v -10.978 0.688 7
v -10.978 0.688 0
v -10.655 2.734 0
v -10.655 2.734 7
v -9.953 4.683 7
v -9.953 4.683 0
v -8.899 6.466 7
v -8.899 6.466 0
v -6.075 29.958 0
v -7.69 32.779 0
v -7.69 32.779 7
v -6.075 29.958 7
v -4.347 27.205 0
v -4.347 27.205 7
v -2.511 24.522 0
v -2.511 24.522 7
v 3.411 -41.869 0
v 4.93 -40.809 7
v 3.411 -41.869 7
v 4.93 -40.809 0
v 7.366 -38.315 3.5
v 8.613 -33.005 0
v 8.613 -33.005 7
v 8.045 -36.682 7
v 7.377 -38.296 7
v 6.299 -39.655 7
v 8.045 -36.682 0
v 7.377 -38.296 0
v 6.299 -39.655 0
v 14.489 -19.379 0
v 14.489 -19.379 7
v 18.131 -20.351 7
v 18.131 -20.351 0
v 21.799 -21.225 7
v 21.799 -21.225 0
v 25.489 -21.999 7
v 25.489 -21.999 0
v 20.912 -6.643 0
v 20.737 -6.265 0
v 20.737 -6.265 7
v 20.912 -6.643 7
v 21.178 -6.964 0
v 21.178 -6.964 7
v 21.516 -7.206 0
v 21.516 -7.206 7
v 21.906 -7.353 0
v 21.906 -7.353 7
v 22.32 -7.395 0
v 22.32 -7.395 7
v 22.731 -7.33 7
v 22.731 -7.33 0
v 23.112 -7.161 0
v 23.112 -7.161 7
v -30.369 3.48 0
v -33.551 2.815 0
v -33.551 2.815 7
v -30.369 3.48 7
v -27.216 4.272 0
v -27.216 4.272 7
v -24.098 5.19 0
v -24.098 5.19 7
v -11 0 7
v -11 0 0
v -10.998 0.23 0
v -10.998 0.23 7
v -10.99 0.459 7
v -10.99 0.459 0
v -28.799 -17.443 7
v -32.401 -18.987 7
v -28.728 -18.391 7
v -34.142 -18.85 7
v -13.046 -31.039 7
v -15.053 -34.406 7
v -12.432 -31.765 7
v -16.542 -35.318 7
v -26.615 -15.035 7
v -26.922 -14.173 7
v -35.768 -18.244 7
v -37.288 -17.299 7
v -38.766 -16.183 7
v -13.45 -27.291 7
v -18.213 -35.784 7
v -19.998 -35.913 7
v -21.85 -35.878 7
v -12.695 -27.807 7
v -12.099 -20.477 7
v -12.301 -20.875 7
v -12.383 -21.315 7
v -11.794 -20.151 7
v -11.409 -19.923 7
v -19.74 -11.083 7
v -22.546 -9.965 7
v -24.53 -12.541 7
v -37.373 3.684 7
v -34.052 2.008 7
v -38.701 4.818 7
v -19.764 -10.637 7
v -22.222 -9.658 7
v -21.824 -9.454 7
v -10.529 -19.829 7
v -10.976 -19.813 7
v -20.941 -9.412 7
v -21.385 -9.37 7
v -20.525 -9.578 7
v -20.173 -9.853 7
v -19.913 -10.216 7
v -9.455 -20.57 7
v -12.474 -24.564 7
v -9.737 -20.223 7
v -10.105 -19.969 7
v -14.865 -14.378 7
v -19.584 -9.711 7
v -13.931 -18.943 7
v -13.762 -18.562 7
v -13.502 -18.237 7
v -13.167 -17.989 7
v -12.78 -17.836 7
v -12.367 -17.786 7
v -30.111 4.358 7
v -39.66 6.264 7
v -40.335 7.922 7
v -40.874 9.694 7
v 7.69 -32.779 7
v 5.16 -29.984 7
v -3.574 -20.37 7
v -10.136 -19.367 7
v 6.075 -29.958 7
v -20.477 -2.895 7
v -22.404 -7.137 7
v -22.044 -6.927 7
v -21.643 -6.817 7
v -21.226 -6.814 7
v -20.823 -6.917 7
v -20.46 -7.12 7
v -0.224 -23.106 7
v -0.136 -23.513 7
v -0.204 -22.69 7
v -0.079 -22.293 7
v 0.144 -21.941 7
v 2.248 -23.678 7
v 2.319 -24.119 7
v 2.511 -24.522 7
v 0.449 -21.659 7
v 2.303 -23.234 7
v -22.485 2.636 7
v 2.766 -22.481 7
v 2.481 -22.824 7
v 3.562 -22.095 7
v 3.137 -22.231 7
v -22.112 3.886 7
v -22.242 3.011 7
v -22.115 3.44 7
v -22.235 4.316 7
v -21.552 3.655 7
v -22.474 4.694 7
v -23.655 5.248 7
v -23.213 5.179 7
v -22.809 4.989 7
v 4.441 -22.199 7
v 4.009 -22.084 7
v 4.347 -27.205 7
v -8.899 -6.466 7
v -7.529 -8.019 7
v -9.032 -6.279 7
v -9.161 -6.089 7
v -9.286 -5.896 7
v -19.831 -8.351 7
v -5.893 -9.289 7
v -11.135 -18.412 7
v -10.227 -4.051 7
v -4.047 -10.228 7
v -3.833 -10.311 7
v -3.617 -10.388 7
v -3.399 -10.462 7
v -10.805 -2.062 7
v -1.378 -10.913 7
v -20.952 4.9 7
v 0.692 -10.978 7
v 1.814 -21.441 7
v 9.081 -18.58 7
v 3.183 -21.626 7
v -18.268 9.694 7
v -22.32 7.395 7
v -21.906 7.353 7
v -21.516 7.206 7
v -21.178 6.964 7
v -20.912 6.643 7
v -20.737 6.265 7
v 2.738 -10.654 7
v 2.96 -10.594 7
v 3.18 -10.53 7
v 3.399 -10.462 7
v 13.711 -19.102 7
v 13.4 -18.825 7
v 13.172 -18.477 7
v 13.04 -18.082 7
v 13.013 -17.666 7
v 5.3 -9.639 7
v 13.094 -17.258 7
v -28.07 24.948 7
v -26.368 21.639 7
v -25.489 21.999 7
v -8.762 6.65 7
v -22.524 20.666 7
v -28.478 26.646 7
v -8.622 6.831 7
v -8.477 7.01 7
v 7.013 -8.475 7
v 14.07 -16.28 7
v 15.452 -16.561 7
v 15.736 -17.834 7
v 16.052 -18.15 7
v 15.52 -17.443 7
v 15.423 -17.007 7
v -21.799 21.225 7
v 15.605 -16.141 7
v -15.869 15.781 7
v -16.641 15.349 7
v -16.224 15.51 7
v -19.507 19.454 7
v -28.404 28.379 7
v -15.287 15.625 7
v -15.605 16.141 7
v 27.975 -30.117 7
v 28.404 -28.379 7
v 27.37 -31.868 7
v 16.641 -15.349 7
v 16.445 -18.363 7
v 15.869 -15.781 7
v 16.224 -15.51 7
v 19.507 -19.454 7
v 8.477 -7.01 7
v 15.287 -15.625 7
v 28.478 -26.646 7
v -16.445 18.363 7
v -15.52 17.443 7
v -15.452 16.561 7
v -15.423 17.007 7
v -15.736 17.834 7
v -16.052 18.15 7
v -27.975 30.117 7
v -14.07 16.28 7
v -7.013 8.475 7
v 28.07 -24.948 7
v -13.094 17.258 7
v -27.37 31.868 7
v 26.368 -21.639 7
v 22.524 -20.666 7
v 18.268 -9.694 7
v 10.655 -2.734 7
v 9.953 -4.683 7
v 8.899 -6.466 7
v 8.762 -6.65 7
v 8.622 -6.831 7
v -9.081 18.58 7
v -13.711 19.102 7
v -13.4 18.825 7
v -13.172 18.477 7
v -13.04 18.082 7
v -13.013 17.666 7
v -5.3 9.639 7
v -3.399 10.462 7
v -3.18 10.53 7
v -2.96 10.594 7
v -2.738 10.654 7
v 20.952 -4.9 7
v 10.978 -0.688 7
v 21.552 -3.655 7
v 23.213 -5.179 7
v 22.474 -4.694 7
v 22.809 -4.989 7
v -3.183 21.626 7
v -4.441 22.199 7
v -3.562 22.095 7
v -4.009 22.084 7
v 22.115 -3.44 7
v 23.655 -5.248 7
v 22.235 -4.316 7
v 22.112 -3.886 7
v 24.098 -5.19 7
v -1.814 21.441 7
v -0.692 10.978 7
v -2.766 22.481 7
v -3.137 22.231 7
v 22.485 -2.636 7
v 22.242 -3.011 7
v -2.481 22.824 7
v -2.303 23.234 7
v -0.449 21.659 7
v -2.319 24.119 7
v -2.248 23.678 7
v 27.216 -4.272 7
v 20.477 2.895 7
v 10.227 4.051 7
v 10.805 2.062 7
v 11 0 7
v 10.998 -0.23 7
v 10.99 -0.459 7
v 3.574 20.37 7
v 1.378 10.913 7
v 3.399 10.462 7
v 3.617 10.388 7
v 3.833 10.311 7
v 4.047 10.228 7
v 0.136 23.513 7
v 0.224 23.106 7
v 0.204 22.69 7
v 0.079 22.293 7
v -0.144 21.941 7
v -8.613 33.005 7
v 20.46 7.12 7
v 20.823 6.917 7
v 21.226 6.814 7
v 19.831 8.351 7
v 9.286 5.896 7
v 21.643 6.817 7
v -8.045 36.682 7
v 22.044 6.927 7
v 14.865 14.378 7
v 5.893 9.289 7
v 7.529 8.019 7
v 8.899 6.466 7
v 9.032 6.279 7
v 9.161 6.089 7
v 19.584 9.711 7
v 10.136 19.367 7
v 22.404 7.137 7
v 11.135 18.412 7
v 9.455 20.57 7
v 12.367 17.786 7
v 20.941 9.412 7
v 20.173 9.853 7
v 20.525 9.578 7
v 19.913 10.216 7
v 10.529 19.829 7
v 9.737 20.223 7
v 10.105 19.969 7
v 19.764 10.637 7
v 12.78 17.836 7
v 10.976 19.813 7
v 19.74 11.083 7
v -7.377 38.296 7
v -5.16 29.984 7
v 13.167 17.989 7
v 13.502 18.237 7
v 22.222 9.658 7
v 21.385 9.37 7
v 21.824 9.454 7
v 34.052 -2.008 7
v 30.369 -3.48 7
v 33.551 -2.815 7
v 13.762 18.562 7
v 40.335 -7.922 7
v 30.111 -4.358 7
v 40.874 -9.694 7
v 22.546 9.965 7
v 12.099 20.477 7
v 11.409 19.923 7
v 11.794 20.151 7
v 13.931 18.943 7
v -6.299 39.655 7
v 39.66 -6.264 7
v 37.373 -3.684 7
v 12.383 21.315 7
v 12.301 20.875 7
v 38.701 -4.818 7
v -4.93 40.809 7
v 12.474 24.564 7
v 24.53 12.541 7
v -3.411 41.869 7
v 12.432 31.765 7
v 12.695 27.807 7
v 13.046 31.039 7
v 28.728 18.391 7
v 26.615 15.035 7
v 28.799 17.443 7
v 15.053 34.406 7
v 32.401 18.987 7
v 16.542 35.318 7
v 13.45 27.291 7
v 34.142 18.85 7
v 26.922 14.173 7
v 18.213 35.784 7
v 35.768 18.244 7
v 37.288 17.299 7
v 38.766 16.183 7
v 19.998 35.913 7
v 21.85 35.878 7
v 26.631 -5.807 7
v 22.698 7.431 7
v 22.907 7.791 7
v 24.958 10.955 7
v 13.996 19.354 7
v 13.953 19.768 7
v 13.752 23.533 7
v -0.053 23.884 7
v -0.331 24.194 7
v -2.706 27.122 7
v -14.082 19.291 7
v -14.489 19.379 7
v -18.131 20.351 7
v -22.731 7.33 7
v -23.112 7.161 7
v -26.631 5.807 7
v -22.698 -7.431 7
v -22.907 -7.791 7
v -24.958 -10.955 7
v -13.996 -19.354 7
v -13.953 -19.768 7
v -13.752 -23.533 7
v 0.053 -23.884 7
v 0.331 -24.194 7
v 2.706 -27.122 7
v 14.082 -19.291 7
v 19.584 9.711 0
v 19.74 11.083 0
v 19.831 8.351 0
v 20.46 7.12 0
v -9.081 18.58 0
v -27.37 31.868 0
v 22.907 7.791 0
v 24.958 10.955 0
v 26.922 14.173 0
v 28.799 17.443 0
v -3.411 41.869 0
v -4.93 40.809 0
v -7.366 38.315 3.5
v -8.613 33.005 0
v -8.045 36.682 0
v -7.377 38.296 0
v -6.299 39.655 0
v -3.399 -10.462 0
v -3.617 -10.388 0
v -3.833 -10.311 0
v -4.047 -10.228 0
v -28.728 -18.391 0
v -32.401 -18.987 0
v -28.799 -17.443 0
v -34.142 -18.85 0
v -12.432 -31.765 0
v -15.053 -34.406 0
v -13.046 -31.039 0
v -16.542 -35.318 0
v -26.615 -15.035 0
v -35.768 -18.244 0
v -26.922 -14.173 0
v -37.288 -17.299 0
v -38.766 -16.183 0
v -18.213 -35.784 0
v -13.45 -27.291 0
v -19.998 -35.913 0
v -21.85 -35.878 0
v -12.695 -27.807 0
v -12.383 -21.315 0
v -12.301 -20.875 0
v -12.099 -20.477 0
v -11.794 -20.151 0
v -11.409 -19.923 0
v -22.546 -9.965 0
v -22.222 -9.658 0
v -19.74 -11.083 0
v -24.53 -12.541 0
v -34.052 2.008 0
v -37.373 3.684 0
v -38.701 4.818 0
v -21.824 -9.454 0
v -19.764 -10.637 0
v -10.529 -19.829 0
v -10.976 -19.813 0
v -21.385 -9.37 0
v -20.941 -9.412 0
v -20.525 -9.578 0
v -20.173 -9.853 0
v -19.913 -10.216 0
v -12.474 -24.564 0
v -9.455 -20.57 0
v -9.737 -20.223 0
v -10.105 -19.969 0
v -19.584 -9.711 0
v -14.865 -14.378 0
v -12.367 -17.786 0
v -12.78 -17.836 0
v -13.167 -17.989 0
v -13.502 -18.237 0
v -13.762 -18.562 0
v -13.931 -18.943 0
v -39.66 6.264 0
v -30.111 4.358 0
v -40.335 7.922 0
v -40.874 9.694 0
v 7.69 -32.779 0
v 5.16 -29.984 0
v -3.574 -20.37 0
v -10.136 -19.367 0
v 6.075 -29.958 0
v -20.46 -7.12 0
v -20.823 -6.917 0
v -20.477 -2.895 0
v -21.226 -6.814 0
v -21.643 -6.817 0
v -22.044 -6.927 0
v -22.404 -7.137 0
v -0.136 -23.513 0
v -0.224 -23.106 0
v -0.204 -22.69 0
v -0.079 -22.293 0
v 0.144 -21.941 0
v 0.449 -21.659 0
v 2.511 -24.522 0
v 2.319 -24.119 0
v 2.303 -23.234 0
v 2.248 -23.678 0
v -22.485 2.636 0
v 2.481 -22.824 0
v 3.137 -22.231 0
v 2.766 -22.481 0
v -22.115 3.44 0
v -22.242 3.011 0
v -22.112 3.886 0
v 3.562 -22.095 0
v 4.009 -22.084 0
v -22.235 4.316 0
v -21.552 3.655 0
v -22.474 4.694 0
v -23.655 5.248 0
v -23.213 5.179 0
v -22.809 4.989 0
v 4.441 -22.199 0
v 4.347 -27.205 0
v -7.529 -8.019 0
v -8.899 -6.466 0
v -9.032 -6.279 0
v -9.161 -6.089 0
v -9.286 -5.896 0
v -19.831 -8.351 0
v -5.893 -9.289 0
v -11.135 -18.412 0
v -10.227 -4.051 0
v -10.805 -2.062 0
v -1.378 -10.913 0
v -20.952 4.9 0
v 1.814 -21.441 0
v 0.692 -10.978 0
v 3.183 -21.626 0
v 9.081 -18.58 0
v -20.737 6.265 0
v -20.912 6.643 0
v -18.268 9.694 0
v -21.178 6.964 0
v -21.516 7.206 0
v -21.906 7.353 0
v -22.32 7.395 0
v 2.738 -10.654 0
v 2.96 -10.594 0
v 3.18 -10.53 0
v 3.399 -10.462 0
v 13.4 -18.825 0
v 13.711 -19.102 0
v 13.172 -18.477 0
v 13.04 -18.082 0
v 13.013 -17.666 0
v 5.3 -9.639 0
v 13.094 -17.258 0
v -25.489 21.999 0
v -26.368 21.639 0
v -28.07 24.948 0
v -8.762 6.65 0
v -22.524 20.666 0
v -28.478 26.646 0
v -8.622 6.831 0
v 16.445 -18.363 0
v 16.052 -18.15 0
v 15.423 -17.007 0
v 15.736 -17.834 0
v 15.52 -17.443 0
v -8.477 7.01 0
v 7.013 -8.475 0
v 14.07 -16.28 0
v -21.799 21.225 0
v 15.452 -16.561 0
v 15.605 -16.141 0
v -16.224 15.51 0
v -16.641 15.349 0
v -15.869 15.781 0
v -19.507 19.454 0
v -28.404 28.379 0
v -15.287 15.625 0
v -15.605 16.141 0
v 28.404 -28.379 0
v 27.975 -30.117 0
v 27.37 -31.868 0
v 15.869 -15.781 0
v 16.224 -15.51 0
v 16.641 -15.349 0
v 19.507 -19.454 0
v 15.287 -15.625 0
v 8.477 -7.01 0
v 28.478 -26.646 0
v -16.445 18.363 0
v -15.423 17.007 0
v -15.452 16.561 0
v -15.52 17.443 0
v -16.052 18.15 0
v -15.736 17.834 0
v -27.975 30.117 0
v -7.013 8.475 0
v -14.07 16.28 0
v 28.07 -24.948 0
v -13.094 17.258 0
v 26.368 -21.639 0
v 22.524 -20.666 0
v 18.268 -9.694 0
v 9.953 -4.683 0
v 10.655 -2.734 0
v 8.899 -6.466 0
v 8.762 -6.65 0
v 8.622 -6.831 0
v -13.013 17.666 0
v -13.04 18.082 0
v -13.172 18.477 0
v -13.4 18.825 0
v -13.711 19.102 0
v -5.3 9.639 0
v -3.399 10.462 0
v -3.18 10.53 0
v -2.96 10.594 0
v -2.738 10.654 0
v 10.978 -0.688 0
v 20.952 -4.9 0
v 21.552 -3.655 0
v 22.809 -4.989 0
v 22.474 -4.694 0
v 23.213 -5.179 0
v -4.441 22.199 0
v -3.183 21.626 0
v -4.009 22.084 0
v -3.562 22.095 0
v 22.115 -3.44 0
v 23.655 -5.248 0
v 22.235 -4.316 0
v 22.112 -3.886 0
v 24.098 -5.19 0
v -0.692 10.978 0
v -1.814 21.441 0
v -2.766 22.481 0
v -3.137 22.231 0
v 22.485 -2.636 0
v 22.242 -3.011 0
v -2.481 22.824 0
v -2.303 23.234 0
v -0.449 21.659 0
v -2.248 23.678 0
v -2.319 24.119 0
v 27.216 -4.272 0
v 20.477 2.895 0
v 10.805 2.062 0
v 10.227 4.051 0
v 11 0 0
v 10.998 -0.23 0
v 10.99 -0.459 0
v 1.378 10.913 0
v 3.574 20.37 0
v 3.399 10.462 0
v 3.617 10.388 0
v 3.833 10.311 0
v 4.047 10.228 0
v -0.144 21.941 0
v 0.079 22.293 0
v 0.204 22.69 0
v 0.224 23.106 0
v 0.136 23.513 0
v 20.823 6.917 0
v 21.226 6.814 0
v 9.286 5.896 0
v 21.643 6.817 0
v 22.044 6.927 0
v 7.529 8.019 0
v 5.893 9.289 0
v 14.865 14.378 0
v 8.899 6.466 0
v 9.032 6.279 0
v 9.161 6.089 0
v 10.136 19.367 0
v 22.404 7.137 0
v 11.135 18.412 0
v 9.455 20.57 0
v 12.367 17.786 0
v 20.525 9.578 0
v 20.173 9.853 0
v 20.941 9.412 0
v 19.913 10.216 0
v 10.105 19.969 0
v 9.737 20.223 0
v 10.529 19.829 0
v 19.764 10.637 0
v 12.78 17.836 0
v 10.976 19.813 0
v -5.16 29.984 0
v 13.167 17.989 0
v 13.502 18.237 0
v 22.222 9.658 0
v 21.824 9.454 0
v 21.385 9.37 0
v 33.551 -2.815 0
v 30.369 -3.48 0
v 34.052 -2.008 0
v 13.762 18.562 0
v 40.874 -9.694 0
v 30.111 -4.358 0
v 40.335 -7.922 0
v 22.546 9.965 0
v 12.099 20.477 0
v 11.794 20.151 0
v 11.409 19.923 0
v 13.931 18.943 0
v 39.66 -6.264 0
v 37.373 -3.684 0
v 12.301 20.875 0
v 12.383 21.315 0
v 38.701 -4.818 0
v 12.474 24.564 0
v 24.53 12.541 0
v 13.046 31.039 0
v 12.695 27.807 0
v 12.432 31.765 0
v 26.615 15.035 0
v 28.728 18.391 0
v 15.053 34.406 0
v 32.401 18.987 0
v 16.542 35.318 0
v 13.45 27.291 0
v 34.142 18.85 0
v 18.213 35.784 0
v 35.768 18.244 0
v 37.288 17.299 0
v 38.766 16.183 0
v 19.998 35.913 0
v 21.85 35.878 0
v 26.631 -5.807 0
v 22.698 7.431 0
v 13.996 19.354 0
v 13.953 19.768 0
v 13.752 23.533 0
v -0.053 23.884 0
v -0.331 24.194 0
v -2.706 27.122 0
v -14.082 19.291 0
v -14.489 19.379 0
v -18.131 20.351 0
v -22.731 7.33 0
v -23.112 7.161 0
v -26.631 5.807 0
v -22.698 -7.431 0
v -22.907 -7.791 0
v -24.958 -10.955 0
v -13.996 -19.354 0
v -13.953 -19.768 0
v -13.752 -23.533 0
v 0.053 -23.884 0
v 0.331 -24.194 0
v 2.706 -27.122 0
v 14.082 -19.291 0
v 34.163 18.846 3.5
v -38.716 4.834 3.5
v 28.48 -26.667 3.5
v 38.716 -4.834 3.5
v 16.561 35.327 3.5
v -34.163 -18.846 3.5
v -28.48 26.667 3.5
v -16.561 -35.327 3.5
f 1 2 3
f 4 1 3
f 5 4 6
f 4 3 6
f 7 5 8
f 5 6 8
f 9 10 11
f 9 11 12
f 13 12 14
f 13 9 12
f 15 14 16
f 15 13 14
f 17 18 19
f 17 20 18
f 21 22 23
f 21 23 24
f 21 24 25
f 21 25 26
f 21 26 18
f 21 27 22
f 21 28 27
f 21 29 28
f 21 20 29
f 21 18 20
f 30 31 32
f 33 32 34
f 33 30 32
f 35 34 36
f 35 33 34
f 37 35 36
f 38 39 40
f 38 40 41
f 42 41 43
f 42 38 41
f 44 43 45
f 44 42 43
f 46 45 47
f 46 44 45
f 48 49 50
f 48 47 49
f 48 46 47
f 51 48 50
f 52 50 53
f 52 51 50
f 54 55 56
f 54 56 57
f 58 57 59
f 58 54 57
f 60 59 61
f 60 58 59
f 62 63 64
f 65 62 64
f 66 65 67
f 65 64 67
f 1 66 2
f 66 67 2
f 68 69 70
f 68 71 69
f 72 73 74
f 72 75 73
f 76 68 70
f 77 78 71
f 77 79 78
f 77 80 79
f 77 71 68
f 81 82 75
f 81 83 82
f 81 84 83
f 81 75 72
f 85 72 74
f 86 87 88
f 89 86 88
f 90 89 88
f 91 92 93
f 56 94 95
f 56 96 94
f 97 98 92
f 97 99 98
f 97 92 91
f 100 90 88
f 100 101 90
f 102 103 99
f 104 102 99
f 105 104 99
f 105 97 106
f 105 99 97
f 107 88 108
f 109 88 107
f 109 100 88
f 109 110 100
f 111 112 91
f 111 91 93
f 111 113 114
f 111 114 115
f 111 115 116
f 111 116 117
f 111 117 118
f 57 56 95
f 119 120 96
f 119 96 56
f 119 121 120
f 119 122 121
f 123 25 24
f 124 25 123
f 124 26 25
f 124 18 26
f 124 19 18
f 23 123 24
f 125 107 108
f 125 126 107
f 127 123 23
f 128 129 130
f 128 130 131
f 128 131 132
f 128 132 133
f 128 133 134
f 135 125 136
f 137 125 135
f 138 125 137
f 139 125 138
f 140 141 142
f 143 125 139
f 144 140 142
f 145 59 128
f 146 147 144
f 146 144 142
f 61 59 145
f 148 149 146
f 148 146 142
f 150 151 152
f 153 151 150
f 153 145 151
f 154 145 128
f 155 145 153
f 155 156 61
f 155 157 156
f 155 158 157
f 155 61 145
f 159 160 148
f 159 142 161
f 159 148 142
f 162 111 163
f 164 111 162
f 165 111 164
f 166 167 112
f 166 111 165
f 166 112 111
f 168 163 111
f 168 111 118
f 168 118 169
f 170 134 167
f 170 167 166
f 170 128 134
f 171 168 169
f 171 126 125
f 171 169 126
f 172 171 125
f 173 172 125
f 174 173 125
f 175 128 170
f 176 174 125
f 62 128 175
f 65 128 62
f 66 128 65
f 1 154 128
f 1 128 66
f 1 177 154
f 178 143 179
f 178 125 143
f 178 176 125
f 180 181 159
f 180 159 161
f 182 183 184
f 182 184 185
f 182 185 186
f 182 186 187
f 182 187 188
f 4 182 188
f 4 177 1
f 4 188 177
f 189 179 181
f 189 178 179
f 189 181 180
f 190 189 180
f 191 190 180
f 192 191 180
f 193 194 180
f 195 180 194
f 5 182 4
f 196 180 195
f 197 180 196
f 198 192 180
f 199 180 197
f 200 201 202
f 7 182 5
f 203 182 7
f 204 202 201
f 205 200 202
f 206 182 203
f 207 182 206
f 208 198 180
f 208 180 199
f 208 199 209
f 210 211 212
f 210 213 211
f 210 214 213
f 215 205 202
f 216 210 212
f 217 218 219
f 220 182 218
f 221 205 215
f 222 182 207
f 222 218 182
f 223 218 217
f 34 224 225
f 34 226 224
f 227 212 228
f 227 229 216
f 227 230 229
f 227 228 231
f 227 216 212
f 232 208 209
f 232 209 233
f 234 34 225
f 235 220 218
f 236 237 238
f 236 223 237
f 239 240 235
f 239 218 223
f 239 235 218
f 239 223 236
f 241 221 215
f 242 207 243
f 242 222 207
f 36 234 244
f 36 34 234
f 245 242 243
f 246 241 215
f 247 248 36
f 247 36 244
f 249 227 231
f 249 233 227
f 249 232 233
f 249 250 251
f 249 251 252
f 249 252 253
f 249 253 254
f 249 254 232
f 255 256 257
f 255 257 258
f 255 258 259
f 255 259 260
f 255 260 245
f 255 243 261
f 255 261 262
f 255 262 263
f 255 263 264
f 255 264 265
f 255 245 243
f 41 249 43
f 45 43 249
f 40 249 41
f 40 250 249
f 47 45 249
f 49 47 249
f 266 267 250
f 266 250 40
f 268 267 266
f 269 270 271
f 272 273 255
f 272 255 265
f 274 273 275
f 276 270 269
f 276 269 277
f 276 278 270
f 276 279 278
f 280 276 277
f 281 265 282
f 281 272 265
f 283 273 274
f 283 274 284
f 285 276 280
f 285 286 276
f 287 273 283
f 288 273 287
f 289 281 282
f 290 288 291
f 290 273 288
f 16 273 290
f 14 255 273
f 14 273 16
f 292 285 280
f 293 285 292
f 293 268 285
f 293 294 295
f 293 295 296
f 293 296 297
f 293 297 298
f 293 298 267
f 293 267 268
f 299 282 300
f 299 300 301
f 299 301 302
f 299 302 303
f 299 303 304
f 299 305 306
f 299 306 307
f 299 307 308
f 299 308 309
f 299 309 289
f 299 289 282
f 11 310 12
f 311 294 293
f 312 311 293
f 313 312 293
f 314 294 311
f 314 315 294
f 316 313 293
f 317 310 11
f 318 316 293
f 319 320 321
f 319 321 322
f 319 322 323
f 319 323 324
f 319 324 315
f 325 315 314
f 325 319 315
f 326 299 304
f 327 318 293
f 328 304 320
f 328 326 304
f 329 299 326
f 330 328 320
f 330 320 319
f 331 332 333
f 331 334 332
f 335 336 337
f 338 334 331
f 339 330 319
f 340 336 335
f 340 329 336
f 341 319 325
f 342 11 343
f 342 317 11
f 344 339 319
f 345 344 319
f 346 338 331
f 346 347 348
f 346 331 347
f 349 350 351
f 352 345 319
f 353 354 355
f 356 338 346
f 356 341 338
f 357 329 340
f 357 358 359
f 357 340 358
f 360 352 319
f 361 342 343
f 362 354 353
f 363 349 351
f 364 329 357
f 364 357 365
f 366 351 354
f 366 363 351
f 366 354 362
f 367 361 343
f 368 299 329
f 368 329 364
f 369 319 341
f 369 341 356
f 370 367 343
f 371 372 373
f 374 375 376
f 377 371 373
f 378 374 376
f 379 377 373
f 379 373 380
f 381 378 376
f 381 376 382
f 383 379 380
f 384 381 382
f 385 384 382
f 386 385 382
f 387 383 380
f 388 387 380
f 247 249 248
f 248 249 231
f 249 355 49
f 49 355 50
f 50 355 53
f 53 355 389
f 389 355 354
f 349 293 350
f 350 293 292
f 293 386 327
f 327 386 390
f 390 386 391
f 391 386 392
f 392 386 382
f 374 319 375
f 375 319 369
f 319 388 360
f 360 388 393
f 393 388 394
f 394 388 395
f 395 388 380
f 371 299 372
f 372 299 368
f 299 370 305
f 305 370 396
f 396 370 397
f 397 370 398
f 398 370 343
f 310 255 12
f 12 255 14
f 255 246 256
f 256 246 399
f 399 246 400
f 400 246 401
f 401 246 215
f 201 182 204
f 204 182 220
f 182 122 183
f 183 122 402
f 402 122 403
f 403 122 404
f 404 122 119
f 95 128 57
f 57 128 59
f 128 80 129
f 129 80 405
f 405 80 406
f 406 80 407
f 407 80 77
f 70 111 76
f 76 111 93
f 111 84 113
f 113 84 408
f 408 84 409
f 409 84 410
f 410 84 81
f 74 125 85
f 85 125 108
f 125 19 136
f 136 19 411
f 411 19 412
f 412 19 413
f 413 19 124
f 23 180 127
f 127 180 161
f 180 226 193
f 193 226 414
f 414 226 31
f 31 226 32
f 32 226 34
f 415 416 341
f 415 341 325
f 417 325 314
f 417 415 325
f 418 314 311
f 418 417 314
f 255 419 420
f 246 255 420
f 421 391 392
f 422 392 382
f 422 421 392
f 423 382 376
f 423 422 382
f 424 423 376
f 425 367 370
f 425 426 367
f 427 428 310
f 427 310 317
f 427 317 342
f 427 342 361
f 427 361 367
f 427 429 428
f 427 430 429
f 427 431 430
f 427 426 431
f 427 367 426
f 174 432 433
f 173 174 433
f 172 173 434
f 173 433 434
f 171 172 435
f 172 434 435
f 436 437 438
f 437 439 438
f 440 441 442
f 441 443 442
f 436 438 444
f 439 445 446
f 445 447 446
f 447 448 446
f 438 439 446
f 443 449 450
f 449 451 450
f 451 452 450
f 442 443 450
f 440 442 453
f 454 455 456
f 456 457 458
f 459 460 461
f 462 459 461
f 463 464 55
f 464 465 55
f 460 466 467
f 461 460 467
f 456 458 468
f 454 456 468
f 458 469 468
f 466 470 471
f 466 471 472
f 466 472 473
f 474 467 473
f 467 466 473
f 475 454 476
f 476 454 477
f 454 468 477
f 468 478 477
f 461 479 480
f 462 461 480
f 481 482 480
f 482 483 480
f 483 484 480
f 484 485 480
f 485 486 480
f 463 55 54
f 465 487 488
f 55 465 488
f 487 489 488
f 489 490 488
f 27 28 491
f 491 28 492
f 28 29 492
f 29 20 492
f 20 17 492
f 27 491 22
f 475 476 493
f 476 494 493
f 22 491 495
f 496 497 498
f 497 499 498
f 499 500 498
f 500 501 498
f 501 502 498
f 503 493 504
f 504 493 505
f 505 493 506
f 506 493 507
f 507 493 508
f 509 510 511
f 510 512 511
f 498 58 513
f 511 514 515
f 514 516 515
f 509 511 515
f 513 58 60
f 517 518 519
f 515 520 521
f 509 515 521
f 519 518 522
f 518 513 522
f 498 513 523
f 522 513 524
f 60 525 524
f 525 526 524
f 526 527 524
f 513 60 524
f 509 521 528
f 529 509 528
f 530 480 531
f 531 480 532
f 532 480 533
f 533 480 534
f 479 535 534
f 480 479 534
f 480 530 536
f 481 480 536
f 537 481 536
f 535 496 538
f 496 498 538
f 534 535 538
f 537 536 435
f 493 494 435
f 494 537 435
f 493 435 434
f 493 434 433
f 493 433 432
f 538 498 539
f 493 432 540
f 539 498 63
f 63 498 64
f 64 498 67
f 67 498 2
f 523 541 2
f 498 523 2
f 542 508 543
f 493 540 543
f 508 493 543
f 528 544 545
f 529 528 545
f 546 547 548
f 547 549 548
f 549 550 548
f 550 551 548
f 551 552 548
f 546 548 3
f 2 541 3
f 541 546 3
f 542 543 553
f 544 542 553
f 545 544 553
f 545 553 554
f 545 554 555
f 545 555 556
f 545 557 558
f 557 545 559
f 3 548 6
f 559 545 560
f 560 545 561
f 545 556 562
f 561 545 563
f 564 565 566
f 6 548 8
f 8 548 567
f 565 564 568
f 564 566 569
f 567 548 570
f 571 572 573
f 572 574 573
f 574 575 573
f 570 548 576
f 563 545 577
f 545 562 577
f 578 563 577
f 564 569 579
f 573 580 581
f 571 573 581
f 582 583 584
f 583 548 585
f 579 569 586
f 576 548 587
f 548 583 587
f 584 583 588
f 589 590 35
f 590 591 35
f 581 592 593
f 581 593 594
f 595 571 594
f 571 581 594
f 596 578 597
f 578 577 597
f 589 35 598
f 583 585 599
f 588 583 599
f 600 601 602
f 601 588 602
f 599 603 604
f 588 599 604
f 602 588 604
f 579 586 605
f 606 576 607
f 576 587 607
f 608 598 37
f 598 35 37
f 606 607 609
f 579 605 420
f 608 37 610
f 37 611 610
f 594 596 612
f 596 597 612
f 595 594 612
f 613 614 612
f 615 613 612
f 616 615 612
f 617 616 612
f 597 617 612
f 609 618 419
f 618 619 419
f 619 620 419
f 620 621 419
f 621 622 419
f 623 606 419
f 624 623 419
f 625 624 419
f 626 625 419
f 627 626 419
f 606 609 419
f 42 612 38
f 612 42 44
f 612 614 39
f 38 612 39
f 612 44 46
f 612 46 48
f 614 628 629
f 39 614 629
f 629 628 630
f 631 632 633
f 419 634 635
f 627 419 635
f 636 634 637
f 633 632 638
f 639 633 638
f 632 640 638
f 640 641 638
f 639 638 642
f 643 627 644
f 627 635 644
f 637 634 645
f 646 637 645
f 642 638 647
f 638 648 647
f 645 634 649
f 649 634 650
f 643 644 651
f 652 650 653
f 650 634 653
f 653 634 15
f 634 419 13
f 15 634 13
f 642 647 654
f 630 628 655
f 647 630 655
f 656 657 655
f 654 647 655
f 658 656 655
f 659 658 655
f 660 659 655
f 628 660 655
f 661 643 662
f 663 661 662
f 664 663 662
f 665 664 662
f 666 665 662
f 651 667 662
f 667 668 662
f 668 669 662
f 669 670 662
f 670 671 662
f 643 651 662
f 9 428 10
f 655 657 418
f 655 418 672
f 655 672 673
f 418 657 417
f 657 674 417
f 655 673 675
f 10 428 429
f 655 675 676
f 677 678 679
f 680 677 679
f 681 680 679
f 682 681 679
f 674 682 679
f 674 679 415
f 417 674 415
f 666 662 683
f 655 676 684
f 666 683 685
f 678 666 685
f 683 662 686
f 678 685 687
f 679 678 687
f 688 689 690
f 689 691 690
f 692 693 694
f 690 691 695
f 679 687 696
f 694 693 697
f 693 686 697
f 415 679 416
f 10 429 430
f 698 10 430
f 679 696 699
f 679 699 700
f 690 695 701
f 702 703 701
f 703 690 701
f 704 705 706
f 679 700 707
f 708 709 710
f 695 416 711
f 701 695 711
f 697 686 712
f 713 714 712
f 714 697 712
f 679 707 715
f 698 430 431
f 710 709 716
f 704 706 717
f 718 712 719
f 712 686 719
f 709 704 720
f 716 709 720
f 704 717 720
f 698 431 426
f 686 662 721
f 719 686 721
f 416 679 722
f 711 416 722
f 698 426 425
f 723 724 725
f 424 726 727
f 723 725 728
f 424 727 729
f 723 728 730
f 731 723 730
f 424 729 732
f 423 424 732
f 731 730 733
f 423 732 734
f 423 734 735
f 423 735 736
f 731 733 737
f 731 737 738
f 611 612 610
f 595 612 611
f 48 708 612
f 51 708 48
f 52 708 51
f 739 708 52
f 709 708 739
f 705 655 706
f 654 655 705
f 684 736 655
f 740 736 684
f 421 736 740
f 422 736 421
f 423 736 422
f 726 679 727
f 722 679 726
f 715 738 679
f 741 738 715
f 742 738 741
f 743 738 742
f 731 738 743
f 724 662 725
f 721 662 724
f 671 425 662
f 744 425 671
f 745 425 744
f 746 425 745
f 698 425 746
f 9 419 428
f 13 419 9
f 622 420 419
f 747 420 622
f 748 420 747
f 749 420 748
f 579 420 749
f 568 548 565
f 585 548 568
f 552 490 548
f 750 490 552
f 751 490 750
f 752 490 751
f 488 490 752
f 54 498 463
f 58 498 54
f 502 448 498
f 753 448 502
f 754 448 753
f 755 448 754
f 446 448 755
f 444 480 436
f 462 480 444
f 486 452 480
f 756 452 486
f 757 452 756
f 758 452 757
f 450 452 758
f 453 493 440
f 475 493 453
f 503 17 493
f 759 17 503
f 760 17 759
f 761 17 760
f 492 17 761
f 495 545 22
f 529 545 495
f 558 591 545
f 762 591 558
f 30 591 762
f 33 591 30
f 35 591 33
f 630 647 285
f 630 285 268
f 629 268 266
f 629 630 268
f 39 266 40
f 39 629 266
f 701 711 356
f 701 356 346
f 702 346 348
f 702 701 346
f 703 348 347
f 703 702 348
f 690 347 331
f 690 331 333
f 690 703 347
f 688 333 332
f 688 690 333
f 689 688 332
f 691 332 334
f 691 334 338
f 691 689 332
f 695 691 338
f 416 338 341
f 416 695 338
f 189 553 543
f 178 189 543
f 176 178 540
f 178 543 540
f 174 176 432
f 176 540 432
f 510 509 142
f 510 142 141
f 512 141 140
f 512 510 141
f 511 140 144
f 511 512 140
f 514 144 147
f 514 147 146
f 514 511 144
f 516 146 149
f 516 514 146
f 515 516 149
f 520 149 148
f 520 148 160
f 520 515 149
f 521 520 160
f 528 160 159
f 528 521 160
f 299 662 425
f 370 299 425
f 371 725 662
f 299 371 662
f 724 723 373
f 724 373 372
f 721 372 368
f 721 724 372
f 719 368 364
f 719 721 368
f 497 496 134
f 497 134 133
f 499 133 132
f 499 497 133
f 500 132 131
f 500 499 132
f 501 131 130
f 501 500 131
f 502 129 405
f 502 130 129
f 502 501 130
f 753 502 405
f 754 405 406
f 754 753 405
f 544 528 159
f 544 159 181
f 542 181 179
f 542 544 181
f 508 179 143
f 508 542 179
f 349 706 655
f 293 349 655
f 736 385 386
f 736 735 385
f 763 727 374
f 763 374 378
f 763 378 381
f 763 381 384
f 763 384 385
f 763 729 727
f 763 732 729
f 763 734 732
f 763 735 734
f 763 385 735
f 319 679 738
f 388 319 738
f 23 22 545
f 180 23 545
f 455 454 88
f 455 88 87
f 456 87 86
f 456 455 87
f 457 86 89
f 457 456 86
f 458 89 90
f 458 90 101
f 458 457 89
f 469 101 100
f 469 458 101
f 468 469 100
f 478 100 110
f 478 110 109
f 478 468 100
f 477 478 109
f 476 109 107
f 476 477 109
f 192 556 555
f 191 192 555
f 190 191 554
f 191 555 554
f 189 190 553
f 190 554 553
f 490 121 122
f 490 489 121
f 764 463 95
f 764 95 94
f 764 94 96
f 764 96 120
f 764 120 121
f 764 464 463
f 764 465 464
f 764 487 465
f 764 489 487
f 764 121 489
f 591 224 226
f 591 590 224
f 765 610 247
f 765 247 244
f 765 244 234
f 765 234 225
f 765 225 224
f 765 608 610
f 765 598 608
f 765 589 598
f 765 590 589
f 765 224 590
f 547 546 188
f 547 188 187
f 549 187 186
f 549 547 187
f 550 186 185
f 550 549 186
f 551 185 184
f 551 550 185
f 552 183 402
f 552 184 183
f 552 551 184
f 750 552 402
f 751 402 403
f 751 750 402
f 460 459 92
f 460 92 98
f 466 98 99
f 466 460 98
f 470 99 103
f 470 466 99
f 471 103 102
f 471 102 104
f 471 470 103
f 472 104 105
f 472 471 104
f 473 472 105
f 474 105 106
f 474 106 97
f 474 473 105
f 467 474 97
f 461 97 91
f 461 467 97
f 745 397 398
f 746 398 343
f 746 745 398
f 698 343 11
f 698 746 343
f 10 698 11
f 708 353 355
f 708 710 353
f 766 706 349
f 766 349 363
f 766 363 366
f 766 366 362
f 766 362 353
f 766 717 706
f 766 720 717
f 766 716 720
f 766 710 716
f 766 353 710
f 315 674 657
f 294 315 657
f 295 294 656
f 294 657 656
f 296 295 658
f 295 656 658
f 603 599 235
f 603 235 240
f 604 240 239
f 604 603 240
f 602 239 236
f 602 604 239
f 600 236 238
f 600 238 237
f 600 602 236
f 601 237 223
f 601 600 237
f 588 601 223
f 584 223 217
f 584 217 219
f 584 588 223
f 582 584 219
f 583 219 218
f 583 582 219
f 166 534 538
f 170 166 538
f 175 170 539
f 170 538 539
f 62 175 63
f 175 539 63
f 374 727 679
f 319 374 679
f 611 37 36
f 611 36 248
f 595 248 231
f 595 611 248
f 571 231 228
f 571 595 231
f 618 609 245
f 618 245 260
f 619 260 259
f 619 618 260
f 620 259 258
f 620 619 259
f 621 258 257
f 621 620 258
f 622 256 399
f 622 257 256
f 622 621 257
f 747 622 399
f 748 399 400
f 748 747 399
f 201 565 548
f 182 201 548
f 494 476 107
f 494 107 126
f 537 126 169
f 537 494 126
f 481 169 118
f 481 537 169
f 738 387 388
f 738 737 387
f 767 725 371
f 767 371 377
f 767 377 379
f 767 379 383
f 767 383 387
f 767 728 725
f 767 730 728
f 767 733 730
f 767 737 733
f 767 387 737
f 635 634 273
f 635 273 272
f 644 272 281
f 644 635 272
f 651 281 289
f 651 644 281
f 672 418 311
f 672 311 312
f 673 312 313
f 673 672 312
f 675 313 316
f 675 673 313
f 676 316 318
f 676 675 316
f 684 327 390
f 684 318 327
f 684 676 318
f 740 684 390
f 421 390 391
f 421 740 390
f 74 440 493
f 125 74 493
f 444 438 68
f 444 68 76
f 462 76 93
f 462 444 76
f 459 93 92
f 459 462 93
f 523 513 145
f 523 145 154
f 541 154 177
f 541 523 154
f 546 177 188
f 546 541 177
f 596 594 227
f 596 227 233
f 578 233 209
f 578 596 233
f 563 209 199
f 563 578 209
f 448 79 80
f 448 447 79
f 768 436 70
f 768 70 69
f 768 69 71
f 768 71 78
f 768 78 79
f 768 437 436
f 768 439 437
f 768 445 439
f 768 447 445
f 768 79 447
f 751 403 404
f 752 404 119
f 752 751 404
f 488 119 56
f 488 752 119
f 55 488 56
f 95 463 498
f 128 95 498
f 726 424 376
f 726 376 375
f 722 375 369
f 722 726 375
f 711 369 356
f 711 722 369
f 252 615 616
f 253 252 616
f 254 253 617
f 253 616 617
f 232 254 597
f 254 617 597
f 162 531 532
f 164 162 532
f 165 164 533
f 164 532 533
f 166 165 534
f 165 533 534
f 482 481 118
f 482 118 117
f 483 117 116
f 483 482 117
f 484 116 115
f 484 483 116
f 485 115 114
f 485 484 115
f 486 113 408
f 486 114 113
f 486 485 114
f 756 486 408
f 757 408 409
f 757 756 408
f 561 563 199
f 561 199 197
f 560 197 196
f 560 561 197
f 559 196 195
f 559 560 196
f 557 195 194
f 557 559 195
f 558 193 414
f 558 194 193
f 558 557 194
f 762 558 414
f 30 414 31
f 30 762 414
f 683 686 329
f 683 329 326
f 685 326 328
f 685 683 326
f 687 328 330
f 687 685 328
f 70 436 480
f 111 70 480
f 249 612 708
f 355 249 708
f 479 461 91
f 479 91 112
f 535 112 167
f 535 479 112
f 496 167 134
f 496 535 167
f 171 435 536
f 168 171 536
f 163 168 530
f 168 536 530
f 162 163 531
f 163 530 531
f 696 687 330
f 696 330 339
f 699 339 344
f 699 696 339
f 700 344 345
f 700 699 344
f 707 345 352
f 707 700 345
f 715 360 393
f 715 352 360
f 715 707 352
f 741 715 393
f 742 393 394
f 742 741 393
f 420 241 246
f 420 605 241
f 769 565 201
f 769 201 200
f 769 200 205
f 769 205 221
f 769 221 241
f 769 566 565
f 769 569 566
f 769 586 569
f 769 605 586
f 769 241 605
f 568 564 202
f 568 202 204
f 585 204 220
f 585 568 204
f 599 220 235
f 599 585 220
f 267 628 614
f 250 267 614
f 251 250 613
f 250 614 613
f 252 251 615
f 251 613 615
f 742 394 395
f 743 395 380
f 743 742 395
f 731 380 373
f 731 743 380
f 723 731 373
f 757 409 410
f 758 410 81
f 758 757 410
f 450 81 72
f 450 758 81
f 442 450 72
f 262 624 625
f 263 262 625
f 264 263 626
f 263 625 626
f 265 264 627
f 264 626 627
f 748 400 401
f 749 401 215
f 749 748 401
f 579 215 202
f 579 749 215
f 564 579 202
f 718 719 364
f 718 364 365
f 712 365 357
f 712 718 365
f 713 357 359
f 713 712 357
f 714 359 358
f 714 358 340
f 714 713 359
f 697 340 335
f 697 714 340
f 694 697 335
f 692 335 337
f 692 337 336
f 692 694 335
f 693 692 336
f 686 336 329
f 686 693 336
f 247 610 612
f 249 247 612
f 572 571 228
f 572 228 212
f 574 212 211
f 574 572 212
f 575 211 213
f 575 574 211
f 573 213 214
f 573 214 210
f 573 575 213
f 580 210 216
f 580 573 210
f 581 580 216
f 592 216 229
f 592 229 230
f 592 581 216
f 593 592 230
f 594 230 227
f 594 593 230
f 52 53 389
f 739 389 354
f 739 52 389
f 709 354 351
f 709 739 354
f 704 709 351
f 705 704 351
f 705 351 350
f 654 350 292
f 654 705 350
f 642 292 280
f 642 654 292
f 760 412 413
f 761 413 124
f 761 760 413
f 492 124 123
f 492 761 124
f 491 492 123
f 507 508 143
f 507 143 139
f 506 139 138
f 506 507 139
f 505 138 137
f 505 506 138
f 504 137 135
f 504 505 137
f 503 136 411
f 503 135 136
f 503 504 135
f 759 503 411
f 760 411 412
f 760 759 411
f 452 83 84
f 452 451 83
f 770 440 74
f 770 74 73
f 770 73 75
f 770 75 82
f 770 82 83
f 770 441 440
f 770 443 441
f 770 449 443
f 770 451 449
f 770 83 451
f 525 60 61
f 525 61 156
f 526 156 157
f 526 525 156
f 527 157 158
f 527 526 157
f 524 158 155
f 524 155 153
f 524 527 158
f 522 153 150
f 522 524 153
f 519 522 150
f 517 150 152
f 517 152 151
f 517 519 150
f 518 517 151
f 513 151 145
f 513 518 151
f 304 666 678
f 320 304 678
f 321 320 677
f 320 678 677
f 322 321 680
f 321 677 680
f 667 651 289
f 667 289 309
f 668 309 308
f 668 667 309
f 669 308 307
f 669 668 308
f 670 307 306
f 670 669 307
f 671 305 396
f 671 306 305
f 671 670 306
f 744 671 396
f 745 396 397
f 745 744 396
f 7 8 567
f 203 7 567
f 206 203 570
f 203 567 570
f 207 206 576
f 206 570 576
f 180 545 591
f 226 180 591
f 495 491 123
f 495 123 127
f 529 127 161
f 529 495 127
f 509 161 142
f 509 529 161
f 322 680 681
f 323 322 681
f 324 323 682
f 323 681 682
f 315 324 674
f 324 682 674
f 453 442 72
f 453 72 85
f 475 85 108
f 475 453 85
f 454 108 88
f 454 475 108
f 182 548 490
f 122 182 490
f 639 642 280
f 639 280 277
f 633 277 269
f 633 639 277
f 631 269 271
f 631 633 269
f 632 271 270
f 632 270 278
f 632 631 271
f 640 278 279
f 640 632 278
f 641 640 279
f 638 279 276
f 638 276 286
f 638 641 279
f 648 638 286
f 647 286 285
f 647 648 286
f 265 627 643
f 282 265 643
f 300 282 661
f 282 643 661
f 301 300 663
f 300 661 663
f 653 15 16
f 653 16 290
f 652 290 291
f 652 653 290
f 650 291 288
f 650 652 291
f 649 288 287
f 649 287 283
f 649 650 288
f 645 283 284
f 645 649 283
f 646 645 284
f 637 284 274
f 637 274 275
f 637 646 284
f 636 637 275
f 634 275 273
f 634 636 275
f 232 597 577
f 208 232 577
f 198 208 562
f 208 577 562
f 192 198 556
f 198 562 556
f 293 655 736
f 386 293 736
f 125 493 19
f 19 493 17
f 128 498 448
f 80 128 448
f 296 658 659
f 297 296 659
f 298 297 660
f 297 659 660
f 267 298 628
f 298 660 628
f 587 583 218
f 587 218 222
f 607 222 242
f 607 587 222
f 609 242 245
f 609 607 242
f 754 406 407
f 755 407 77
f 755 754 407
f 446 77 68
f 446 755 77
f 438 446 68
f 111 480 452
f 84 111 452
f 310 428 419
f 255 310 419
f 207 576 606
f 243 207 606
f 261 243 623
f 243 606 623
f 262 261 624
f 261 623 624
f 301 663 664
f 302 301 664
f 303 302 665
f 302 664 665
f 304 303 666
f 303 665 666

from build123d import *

# Parameters (mm, degrees)
F1_DEPTH      = 7
F3_DEPTH      = 80
F3_DEPTH_BACK = 25
F4_COUNT      = 10


# Not quite as in the source:
# - an extrude ends at something that could not be found from the text; its depth is read off the source's solid


with BuildPart() as f1:
    # F0 (on Top) → F1 (new body)
    with BuildSketch(Plane.XY):
        with BuildLine():
            ThreePointArc((9.2862347639, 5.8962567709), (10.5628732456, 3.0701317233), (11, 0))
            ThreePointArc((11, 0), (9.4389817008, -5.6485063912), (5.1989773724, -9.6938451752))
            Line((5.1989773724, -9.6938451752), (17.4936950276, -9.6938451752))
            ThreePointArc((17.4936950276, -9.6938451752), (19.3632887257, -5.0063010021), (20, 0))
            ThreePointArc((20, 0), (19.9371690623, 1.5840737934), (19.7490710217, 3.1581947026))
            Line((19.7490710217, 3.1581947026), (12.9913196682, 5.5989294212))
            ThreePointArc((12.9913196682, 5.5989294212), (12.1549883134, 5.8213640414), (11.2928291783, 5.8962567709))
            Line((11.2928291783, 5.8962567709), (9.2862347639, 5.8962567709))
        make_face()
        with BuildLine():
            ThreePointArc((5.1989773724, -9.6938451752), (-10.6404023576, 2.7895945347), (9.2862347639, 5.8962567709))
            Line((9.2862347639, 5.8962567709), (11.2928291783, 5.8962567709))
            ThreePointArc((11.2928291783, 5.8962567709), (12.1549883134, 5.8213640414), (12.9913196682, 5.5989294212))
            Line((12.9913196682, 5.5989294212), (19.7490710217, 3.1581947026))
            ThreePointArc((19.7490710217, 3.1581947026), (-19.6989755573, 3.4569295616), (17.4936950276, -9.6938451752))
            Line((17.4936950276, -9.6938451752), (5.1989773724, -9.6938451752))
        make_face()
        with BuildLine():
            ThreePointArc((20, 0), (19.3632887257, -5.0063010021), (17.4936950276, -9.6938451752))
            Line((17.4936950276, -9.6938451752), (40.8740527928, -9.6938451752))
            add(Edge.make_bspline(
                [(34.0516753495, -2.0075566135), (35.8141325987, -2.7740908853), (39.3168982789, -4.2975263847), (40.357193967, -7.9026709732), (40.8740527928, -9.6938451752)],
                knots=[0, 0, 0, 0, 0.5031616186, 1, 1, 1, 1], degree=3))
            Line((34.0516753495, -2.0075566135), (19.7490710217, 3.1581947026))
            ThreePointArc((19.7490710217, 3.1581947026), (19.9371690623, 1.5840737934), (20, 0))
        make_face()
    extrude(amount=F1_DEPTH)

    # F2 (on Top) → F3 (cut, two sides)
    with BuildSketch(Plane.XY) as f3_sk:
        with BuildLine():
            ThreePointArc((24.097783491, -5.1900828257), (22.3410218592, -4.5133442837), (22.484831512, -2.6362440549))
            ThreePointArc((22.484831512, -2.6362440549), (21.2063665687, -4.2559181051), (20.7374691963, -6.2653836794))
            ThreePointArc((20.7374691963, -6.2653836794), (21.7064439422, -7.2920152577), (23.1120903045, -7.1614673361))
            ThreePointArc((23.1120903045, -7.1614673361), (28.3759705314, -5.094612778), (33.5514694452, -2.8154607862))
            ThreePointArc((33.5514694452, -2.8154607862), (28.7888988276, -3.8605353205), (24.097783491, -5.1900828257))
        make_face()
    extrude(amount=-F3_DEPTH, mode=Mode.SUBTRACT)
    extrude(f3_sk.sketch, amount=F3_DEPTH_BACK, mode=Mode.SUBTRACT)

    # F4: F1 ×10 about axis
    f4_axis = Axis((0, 0, 7), (0, 0, 1))


with BuildPart() as f1_1:
    add(f1.part)
    for i in range(1, F4_COUNT):
        add(f1.part.rotate(f4_axis, i * 360 / F4_COUNT))


solid = f1_1.part
